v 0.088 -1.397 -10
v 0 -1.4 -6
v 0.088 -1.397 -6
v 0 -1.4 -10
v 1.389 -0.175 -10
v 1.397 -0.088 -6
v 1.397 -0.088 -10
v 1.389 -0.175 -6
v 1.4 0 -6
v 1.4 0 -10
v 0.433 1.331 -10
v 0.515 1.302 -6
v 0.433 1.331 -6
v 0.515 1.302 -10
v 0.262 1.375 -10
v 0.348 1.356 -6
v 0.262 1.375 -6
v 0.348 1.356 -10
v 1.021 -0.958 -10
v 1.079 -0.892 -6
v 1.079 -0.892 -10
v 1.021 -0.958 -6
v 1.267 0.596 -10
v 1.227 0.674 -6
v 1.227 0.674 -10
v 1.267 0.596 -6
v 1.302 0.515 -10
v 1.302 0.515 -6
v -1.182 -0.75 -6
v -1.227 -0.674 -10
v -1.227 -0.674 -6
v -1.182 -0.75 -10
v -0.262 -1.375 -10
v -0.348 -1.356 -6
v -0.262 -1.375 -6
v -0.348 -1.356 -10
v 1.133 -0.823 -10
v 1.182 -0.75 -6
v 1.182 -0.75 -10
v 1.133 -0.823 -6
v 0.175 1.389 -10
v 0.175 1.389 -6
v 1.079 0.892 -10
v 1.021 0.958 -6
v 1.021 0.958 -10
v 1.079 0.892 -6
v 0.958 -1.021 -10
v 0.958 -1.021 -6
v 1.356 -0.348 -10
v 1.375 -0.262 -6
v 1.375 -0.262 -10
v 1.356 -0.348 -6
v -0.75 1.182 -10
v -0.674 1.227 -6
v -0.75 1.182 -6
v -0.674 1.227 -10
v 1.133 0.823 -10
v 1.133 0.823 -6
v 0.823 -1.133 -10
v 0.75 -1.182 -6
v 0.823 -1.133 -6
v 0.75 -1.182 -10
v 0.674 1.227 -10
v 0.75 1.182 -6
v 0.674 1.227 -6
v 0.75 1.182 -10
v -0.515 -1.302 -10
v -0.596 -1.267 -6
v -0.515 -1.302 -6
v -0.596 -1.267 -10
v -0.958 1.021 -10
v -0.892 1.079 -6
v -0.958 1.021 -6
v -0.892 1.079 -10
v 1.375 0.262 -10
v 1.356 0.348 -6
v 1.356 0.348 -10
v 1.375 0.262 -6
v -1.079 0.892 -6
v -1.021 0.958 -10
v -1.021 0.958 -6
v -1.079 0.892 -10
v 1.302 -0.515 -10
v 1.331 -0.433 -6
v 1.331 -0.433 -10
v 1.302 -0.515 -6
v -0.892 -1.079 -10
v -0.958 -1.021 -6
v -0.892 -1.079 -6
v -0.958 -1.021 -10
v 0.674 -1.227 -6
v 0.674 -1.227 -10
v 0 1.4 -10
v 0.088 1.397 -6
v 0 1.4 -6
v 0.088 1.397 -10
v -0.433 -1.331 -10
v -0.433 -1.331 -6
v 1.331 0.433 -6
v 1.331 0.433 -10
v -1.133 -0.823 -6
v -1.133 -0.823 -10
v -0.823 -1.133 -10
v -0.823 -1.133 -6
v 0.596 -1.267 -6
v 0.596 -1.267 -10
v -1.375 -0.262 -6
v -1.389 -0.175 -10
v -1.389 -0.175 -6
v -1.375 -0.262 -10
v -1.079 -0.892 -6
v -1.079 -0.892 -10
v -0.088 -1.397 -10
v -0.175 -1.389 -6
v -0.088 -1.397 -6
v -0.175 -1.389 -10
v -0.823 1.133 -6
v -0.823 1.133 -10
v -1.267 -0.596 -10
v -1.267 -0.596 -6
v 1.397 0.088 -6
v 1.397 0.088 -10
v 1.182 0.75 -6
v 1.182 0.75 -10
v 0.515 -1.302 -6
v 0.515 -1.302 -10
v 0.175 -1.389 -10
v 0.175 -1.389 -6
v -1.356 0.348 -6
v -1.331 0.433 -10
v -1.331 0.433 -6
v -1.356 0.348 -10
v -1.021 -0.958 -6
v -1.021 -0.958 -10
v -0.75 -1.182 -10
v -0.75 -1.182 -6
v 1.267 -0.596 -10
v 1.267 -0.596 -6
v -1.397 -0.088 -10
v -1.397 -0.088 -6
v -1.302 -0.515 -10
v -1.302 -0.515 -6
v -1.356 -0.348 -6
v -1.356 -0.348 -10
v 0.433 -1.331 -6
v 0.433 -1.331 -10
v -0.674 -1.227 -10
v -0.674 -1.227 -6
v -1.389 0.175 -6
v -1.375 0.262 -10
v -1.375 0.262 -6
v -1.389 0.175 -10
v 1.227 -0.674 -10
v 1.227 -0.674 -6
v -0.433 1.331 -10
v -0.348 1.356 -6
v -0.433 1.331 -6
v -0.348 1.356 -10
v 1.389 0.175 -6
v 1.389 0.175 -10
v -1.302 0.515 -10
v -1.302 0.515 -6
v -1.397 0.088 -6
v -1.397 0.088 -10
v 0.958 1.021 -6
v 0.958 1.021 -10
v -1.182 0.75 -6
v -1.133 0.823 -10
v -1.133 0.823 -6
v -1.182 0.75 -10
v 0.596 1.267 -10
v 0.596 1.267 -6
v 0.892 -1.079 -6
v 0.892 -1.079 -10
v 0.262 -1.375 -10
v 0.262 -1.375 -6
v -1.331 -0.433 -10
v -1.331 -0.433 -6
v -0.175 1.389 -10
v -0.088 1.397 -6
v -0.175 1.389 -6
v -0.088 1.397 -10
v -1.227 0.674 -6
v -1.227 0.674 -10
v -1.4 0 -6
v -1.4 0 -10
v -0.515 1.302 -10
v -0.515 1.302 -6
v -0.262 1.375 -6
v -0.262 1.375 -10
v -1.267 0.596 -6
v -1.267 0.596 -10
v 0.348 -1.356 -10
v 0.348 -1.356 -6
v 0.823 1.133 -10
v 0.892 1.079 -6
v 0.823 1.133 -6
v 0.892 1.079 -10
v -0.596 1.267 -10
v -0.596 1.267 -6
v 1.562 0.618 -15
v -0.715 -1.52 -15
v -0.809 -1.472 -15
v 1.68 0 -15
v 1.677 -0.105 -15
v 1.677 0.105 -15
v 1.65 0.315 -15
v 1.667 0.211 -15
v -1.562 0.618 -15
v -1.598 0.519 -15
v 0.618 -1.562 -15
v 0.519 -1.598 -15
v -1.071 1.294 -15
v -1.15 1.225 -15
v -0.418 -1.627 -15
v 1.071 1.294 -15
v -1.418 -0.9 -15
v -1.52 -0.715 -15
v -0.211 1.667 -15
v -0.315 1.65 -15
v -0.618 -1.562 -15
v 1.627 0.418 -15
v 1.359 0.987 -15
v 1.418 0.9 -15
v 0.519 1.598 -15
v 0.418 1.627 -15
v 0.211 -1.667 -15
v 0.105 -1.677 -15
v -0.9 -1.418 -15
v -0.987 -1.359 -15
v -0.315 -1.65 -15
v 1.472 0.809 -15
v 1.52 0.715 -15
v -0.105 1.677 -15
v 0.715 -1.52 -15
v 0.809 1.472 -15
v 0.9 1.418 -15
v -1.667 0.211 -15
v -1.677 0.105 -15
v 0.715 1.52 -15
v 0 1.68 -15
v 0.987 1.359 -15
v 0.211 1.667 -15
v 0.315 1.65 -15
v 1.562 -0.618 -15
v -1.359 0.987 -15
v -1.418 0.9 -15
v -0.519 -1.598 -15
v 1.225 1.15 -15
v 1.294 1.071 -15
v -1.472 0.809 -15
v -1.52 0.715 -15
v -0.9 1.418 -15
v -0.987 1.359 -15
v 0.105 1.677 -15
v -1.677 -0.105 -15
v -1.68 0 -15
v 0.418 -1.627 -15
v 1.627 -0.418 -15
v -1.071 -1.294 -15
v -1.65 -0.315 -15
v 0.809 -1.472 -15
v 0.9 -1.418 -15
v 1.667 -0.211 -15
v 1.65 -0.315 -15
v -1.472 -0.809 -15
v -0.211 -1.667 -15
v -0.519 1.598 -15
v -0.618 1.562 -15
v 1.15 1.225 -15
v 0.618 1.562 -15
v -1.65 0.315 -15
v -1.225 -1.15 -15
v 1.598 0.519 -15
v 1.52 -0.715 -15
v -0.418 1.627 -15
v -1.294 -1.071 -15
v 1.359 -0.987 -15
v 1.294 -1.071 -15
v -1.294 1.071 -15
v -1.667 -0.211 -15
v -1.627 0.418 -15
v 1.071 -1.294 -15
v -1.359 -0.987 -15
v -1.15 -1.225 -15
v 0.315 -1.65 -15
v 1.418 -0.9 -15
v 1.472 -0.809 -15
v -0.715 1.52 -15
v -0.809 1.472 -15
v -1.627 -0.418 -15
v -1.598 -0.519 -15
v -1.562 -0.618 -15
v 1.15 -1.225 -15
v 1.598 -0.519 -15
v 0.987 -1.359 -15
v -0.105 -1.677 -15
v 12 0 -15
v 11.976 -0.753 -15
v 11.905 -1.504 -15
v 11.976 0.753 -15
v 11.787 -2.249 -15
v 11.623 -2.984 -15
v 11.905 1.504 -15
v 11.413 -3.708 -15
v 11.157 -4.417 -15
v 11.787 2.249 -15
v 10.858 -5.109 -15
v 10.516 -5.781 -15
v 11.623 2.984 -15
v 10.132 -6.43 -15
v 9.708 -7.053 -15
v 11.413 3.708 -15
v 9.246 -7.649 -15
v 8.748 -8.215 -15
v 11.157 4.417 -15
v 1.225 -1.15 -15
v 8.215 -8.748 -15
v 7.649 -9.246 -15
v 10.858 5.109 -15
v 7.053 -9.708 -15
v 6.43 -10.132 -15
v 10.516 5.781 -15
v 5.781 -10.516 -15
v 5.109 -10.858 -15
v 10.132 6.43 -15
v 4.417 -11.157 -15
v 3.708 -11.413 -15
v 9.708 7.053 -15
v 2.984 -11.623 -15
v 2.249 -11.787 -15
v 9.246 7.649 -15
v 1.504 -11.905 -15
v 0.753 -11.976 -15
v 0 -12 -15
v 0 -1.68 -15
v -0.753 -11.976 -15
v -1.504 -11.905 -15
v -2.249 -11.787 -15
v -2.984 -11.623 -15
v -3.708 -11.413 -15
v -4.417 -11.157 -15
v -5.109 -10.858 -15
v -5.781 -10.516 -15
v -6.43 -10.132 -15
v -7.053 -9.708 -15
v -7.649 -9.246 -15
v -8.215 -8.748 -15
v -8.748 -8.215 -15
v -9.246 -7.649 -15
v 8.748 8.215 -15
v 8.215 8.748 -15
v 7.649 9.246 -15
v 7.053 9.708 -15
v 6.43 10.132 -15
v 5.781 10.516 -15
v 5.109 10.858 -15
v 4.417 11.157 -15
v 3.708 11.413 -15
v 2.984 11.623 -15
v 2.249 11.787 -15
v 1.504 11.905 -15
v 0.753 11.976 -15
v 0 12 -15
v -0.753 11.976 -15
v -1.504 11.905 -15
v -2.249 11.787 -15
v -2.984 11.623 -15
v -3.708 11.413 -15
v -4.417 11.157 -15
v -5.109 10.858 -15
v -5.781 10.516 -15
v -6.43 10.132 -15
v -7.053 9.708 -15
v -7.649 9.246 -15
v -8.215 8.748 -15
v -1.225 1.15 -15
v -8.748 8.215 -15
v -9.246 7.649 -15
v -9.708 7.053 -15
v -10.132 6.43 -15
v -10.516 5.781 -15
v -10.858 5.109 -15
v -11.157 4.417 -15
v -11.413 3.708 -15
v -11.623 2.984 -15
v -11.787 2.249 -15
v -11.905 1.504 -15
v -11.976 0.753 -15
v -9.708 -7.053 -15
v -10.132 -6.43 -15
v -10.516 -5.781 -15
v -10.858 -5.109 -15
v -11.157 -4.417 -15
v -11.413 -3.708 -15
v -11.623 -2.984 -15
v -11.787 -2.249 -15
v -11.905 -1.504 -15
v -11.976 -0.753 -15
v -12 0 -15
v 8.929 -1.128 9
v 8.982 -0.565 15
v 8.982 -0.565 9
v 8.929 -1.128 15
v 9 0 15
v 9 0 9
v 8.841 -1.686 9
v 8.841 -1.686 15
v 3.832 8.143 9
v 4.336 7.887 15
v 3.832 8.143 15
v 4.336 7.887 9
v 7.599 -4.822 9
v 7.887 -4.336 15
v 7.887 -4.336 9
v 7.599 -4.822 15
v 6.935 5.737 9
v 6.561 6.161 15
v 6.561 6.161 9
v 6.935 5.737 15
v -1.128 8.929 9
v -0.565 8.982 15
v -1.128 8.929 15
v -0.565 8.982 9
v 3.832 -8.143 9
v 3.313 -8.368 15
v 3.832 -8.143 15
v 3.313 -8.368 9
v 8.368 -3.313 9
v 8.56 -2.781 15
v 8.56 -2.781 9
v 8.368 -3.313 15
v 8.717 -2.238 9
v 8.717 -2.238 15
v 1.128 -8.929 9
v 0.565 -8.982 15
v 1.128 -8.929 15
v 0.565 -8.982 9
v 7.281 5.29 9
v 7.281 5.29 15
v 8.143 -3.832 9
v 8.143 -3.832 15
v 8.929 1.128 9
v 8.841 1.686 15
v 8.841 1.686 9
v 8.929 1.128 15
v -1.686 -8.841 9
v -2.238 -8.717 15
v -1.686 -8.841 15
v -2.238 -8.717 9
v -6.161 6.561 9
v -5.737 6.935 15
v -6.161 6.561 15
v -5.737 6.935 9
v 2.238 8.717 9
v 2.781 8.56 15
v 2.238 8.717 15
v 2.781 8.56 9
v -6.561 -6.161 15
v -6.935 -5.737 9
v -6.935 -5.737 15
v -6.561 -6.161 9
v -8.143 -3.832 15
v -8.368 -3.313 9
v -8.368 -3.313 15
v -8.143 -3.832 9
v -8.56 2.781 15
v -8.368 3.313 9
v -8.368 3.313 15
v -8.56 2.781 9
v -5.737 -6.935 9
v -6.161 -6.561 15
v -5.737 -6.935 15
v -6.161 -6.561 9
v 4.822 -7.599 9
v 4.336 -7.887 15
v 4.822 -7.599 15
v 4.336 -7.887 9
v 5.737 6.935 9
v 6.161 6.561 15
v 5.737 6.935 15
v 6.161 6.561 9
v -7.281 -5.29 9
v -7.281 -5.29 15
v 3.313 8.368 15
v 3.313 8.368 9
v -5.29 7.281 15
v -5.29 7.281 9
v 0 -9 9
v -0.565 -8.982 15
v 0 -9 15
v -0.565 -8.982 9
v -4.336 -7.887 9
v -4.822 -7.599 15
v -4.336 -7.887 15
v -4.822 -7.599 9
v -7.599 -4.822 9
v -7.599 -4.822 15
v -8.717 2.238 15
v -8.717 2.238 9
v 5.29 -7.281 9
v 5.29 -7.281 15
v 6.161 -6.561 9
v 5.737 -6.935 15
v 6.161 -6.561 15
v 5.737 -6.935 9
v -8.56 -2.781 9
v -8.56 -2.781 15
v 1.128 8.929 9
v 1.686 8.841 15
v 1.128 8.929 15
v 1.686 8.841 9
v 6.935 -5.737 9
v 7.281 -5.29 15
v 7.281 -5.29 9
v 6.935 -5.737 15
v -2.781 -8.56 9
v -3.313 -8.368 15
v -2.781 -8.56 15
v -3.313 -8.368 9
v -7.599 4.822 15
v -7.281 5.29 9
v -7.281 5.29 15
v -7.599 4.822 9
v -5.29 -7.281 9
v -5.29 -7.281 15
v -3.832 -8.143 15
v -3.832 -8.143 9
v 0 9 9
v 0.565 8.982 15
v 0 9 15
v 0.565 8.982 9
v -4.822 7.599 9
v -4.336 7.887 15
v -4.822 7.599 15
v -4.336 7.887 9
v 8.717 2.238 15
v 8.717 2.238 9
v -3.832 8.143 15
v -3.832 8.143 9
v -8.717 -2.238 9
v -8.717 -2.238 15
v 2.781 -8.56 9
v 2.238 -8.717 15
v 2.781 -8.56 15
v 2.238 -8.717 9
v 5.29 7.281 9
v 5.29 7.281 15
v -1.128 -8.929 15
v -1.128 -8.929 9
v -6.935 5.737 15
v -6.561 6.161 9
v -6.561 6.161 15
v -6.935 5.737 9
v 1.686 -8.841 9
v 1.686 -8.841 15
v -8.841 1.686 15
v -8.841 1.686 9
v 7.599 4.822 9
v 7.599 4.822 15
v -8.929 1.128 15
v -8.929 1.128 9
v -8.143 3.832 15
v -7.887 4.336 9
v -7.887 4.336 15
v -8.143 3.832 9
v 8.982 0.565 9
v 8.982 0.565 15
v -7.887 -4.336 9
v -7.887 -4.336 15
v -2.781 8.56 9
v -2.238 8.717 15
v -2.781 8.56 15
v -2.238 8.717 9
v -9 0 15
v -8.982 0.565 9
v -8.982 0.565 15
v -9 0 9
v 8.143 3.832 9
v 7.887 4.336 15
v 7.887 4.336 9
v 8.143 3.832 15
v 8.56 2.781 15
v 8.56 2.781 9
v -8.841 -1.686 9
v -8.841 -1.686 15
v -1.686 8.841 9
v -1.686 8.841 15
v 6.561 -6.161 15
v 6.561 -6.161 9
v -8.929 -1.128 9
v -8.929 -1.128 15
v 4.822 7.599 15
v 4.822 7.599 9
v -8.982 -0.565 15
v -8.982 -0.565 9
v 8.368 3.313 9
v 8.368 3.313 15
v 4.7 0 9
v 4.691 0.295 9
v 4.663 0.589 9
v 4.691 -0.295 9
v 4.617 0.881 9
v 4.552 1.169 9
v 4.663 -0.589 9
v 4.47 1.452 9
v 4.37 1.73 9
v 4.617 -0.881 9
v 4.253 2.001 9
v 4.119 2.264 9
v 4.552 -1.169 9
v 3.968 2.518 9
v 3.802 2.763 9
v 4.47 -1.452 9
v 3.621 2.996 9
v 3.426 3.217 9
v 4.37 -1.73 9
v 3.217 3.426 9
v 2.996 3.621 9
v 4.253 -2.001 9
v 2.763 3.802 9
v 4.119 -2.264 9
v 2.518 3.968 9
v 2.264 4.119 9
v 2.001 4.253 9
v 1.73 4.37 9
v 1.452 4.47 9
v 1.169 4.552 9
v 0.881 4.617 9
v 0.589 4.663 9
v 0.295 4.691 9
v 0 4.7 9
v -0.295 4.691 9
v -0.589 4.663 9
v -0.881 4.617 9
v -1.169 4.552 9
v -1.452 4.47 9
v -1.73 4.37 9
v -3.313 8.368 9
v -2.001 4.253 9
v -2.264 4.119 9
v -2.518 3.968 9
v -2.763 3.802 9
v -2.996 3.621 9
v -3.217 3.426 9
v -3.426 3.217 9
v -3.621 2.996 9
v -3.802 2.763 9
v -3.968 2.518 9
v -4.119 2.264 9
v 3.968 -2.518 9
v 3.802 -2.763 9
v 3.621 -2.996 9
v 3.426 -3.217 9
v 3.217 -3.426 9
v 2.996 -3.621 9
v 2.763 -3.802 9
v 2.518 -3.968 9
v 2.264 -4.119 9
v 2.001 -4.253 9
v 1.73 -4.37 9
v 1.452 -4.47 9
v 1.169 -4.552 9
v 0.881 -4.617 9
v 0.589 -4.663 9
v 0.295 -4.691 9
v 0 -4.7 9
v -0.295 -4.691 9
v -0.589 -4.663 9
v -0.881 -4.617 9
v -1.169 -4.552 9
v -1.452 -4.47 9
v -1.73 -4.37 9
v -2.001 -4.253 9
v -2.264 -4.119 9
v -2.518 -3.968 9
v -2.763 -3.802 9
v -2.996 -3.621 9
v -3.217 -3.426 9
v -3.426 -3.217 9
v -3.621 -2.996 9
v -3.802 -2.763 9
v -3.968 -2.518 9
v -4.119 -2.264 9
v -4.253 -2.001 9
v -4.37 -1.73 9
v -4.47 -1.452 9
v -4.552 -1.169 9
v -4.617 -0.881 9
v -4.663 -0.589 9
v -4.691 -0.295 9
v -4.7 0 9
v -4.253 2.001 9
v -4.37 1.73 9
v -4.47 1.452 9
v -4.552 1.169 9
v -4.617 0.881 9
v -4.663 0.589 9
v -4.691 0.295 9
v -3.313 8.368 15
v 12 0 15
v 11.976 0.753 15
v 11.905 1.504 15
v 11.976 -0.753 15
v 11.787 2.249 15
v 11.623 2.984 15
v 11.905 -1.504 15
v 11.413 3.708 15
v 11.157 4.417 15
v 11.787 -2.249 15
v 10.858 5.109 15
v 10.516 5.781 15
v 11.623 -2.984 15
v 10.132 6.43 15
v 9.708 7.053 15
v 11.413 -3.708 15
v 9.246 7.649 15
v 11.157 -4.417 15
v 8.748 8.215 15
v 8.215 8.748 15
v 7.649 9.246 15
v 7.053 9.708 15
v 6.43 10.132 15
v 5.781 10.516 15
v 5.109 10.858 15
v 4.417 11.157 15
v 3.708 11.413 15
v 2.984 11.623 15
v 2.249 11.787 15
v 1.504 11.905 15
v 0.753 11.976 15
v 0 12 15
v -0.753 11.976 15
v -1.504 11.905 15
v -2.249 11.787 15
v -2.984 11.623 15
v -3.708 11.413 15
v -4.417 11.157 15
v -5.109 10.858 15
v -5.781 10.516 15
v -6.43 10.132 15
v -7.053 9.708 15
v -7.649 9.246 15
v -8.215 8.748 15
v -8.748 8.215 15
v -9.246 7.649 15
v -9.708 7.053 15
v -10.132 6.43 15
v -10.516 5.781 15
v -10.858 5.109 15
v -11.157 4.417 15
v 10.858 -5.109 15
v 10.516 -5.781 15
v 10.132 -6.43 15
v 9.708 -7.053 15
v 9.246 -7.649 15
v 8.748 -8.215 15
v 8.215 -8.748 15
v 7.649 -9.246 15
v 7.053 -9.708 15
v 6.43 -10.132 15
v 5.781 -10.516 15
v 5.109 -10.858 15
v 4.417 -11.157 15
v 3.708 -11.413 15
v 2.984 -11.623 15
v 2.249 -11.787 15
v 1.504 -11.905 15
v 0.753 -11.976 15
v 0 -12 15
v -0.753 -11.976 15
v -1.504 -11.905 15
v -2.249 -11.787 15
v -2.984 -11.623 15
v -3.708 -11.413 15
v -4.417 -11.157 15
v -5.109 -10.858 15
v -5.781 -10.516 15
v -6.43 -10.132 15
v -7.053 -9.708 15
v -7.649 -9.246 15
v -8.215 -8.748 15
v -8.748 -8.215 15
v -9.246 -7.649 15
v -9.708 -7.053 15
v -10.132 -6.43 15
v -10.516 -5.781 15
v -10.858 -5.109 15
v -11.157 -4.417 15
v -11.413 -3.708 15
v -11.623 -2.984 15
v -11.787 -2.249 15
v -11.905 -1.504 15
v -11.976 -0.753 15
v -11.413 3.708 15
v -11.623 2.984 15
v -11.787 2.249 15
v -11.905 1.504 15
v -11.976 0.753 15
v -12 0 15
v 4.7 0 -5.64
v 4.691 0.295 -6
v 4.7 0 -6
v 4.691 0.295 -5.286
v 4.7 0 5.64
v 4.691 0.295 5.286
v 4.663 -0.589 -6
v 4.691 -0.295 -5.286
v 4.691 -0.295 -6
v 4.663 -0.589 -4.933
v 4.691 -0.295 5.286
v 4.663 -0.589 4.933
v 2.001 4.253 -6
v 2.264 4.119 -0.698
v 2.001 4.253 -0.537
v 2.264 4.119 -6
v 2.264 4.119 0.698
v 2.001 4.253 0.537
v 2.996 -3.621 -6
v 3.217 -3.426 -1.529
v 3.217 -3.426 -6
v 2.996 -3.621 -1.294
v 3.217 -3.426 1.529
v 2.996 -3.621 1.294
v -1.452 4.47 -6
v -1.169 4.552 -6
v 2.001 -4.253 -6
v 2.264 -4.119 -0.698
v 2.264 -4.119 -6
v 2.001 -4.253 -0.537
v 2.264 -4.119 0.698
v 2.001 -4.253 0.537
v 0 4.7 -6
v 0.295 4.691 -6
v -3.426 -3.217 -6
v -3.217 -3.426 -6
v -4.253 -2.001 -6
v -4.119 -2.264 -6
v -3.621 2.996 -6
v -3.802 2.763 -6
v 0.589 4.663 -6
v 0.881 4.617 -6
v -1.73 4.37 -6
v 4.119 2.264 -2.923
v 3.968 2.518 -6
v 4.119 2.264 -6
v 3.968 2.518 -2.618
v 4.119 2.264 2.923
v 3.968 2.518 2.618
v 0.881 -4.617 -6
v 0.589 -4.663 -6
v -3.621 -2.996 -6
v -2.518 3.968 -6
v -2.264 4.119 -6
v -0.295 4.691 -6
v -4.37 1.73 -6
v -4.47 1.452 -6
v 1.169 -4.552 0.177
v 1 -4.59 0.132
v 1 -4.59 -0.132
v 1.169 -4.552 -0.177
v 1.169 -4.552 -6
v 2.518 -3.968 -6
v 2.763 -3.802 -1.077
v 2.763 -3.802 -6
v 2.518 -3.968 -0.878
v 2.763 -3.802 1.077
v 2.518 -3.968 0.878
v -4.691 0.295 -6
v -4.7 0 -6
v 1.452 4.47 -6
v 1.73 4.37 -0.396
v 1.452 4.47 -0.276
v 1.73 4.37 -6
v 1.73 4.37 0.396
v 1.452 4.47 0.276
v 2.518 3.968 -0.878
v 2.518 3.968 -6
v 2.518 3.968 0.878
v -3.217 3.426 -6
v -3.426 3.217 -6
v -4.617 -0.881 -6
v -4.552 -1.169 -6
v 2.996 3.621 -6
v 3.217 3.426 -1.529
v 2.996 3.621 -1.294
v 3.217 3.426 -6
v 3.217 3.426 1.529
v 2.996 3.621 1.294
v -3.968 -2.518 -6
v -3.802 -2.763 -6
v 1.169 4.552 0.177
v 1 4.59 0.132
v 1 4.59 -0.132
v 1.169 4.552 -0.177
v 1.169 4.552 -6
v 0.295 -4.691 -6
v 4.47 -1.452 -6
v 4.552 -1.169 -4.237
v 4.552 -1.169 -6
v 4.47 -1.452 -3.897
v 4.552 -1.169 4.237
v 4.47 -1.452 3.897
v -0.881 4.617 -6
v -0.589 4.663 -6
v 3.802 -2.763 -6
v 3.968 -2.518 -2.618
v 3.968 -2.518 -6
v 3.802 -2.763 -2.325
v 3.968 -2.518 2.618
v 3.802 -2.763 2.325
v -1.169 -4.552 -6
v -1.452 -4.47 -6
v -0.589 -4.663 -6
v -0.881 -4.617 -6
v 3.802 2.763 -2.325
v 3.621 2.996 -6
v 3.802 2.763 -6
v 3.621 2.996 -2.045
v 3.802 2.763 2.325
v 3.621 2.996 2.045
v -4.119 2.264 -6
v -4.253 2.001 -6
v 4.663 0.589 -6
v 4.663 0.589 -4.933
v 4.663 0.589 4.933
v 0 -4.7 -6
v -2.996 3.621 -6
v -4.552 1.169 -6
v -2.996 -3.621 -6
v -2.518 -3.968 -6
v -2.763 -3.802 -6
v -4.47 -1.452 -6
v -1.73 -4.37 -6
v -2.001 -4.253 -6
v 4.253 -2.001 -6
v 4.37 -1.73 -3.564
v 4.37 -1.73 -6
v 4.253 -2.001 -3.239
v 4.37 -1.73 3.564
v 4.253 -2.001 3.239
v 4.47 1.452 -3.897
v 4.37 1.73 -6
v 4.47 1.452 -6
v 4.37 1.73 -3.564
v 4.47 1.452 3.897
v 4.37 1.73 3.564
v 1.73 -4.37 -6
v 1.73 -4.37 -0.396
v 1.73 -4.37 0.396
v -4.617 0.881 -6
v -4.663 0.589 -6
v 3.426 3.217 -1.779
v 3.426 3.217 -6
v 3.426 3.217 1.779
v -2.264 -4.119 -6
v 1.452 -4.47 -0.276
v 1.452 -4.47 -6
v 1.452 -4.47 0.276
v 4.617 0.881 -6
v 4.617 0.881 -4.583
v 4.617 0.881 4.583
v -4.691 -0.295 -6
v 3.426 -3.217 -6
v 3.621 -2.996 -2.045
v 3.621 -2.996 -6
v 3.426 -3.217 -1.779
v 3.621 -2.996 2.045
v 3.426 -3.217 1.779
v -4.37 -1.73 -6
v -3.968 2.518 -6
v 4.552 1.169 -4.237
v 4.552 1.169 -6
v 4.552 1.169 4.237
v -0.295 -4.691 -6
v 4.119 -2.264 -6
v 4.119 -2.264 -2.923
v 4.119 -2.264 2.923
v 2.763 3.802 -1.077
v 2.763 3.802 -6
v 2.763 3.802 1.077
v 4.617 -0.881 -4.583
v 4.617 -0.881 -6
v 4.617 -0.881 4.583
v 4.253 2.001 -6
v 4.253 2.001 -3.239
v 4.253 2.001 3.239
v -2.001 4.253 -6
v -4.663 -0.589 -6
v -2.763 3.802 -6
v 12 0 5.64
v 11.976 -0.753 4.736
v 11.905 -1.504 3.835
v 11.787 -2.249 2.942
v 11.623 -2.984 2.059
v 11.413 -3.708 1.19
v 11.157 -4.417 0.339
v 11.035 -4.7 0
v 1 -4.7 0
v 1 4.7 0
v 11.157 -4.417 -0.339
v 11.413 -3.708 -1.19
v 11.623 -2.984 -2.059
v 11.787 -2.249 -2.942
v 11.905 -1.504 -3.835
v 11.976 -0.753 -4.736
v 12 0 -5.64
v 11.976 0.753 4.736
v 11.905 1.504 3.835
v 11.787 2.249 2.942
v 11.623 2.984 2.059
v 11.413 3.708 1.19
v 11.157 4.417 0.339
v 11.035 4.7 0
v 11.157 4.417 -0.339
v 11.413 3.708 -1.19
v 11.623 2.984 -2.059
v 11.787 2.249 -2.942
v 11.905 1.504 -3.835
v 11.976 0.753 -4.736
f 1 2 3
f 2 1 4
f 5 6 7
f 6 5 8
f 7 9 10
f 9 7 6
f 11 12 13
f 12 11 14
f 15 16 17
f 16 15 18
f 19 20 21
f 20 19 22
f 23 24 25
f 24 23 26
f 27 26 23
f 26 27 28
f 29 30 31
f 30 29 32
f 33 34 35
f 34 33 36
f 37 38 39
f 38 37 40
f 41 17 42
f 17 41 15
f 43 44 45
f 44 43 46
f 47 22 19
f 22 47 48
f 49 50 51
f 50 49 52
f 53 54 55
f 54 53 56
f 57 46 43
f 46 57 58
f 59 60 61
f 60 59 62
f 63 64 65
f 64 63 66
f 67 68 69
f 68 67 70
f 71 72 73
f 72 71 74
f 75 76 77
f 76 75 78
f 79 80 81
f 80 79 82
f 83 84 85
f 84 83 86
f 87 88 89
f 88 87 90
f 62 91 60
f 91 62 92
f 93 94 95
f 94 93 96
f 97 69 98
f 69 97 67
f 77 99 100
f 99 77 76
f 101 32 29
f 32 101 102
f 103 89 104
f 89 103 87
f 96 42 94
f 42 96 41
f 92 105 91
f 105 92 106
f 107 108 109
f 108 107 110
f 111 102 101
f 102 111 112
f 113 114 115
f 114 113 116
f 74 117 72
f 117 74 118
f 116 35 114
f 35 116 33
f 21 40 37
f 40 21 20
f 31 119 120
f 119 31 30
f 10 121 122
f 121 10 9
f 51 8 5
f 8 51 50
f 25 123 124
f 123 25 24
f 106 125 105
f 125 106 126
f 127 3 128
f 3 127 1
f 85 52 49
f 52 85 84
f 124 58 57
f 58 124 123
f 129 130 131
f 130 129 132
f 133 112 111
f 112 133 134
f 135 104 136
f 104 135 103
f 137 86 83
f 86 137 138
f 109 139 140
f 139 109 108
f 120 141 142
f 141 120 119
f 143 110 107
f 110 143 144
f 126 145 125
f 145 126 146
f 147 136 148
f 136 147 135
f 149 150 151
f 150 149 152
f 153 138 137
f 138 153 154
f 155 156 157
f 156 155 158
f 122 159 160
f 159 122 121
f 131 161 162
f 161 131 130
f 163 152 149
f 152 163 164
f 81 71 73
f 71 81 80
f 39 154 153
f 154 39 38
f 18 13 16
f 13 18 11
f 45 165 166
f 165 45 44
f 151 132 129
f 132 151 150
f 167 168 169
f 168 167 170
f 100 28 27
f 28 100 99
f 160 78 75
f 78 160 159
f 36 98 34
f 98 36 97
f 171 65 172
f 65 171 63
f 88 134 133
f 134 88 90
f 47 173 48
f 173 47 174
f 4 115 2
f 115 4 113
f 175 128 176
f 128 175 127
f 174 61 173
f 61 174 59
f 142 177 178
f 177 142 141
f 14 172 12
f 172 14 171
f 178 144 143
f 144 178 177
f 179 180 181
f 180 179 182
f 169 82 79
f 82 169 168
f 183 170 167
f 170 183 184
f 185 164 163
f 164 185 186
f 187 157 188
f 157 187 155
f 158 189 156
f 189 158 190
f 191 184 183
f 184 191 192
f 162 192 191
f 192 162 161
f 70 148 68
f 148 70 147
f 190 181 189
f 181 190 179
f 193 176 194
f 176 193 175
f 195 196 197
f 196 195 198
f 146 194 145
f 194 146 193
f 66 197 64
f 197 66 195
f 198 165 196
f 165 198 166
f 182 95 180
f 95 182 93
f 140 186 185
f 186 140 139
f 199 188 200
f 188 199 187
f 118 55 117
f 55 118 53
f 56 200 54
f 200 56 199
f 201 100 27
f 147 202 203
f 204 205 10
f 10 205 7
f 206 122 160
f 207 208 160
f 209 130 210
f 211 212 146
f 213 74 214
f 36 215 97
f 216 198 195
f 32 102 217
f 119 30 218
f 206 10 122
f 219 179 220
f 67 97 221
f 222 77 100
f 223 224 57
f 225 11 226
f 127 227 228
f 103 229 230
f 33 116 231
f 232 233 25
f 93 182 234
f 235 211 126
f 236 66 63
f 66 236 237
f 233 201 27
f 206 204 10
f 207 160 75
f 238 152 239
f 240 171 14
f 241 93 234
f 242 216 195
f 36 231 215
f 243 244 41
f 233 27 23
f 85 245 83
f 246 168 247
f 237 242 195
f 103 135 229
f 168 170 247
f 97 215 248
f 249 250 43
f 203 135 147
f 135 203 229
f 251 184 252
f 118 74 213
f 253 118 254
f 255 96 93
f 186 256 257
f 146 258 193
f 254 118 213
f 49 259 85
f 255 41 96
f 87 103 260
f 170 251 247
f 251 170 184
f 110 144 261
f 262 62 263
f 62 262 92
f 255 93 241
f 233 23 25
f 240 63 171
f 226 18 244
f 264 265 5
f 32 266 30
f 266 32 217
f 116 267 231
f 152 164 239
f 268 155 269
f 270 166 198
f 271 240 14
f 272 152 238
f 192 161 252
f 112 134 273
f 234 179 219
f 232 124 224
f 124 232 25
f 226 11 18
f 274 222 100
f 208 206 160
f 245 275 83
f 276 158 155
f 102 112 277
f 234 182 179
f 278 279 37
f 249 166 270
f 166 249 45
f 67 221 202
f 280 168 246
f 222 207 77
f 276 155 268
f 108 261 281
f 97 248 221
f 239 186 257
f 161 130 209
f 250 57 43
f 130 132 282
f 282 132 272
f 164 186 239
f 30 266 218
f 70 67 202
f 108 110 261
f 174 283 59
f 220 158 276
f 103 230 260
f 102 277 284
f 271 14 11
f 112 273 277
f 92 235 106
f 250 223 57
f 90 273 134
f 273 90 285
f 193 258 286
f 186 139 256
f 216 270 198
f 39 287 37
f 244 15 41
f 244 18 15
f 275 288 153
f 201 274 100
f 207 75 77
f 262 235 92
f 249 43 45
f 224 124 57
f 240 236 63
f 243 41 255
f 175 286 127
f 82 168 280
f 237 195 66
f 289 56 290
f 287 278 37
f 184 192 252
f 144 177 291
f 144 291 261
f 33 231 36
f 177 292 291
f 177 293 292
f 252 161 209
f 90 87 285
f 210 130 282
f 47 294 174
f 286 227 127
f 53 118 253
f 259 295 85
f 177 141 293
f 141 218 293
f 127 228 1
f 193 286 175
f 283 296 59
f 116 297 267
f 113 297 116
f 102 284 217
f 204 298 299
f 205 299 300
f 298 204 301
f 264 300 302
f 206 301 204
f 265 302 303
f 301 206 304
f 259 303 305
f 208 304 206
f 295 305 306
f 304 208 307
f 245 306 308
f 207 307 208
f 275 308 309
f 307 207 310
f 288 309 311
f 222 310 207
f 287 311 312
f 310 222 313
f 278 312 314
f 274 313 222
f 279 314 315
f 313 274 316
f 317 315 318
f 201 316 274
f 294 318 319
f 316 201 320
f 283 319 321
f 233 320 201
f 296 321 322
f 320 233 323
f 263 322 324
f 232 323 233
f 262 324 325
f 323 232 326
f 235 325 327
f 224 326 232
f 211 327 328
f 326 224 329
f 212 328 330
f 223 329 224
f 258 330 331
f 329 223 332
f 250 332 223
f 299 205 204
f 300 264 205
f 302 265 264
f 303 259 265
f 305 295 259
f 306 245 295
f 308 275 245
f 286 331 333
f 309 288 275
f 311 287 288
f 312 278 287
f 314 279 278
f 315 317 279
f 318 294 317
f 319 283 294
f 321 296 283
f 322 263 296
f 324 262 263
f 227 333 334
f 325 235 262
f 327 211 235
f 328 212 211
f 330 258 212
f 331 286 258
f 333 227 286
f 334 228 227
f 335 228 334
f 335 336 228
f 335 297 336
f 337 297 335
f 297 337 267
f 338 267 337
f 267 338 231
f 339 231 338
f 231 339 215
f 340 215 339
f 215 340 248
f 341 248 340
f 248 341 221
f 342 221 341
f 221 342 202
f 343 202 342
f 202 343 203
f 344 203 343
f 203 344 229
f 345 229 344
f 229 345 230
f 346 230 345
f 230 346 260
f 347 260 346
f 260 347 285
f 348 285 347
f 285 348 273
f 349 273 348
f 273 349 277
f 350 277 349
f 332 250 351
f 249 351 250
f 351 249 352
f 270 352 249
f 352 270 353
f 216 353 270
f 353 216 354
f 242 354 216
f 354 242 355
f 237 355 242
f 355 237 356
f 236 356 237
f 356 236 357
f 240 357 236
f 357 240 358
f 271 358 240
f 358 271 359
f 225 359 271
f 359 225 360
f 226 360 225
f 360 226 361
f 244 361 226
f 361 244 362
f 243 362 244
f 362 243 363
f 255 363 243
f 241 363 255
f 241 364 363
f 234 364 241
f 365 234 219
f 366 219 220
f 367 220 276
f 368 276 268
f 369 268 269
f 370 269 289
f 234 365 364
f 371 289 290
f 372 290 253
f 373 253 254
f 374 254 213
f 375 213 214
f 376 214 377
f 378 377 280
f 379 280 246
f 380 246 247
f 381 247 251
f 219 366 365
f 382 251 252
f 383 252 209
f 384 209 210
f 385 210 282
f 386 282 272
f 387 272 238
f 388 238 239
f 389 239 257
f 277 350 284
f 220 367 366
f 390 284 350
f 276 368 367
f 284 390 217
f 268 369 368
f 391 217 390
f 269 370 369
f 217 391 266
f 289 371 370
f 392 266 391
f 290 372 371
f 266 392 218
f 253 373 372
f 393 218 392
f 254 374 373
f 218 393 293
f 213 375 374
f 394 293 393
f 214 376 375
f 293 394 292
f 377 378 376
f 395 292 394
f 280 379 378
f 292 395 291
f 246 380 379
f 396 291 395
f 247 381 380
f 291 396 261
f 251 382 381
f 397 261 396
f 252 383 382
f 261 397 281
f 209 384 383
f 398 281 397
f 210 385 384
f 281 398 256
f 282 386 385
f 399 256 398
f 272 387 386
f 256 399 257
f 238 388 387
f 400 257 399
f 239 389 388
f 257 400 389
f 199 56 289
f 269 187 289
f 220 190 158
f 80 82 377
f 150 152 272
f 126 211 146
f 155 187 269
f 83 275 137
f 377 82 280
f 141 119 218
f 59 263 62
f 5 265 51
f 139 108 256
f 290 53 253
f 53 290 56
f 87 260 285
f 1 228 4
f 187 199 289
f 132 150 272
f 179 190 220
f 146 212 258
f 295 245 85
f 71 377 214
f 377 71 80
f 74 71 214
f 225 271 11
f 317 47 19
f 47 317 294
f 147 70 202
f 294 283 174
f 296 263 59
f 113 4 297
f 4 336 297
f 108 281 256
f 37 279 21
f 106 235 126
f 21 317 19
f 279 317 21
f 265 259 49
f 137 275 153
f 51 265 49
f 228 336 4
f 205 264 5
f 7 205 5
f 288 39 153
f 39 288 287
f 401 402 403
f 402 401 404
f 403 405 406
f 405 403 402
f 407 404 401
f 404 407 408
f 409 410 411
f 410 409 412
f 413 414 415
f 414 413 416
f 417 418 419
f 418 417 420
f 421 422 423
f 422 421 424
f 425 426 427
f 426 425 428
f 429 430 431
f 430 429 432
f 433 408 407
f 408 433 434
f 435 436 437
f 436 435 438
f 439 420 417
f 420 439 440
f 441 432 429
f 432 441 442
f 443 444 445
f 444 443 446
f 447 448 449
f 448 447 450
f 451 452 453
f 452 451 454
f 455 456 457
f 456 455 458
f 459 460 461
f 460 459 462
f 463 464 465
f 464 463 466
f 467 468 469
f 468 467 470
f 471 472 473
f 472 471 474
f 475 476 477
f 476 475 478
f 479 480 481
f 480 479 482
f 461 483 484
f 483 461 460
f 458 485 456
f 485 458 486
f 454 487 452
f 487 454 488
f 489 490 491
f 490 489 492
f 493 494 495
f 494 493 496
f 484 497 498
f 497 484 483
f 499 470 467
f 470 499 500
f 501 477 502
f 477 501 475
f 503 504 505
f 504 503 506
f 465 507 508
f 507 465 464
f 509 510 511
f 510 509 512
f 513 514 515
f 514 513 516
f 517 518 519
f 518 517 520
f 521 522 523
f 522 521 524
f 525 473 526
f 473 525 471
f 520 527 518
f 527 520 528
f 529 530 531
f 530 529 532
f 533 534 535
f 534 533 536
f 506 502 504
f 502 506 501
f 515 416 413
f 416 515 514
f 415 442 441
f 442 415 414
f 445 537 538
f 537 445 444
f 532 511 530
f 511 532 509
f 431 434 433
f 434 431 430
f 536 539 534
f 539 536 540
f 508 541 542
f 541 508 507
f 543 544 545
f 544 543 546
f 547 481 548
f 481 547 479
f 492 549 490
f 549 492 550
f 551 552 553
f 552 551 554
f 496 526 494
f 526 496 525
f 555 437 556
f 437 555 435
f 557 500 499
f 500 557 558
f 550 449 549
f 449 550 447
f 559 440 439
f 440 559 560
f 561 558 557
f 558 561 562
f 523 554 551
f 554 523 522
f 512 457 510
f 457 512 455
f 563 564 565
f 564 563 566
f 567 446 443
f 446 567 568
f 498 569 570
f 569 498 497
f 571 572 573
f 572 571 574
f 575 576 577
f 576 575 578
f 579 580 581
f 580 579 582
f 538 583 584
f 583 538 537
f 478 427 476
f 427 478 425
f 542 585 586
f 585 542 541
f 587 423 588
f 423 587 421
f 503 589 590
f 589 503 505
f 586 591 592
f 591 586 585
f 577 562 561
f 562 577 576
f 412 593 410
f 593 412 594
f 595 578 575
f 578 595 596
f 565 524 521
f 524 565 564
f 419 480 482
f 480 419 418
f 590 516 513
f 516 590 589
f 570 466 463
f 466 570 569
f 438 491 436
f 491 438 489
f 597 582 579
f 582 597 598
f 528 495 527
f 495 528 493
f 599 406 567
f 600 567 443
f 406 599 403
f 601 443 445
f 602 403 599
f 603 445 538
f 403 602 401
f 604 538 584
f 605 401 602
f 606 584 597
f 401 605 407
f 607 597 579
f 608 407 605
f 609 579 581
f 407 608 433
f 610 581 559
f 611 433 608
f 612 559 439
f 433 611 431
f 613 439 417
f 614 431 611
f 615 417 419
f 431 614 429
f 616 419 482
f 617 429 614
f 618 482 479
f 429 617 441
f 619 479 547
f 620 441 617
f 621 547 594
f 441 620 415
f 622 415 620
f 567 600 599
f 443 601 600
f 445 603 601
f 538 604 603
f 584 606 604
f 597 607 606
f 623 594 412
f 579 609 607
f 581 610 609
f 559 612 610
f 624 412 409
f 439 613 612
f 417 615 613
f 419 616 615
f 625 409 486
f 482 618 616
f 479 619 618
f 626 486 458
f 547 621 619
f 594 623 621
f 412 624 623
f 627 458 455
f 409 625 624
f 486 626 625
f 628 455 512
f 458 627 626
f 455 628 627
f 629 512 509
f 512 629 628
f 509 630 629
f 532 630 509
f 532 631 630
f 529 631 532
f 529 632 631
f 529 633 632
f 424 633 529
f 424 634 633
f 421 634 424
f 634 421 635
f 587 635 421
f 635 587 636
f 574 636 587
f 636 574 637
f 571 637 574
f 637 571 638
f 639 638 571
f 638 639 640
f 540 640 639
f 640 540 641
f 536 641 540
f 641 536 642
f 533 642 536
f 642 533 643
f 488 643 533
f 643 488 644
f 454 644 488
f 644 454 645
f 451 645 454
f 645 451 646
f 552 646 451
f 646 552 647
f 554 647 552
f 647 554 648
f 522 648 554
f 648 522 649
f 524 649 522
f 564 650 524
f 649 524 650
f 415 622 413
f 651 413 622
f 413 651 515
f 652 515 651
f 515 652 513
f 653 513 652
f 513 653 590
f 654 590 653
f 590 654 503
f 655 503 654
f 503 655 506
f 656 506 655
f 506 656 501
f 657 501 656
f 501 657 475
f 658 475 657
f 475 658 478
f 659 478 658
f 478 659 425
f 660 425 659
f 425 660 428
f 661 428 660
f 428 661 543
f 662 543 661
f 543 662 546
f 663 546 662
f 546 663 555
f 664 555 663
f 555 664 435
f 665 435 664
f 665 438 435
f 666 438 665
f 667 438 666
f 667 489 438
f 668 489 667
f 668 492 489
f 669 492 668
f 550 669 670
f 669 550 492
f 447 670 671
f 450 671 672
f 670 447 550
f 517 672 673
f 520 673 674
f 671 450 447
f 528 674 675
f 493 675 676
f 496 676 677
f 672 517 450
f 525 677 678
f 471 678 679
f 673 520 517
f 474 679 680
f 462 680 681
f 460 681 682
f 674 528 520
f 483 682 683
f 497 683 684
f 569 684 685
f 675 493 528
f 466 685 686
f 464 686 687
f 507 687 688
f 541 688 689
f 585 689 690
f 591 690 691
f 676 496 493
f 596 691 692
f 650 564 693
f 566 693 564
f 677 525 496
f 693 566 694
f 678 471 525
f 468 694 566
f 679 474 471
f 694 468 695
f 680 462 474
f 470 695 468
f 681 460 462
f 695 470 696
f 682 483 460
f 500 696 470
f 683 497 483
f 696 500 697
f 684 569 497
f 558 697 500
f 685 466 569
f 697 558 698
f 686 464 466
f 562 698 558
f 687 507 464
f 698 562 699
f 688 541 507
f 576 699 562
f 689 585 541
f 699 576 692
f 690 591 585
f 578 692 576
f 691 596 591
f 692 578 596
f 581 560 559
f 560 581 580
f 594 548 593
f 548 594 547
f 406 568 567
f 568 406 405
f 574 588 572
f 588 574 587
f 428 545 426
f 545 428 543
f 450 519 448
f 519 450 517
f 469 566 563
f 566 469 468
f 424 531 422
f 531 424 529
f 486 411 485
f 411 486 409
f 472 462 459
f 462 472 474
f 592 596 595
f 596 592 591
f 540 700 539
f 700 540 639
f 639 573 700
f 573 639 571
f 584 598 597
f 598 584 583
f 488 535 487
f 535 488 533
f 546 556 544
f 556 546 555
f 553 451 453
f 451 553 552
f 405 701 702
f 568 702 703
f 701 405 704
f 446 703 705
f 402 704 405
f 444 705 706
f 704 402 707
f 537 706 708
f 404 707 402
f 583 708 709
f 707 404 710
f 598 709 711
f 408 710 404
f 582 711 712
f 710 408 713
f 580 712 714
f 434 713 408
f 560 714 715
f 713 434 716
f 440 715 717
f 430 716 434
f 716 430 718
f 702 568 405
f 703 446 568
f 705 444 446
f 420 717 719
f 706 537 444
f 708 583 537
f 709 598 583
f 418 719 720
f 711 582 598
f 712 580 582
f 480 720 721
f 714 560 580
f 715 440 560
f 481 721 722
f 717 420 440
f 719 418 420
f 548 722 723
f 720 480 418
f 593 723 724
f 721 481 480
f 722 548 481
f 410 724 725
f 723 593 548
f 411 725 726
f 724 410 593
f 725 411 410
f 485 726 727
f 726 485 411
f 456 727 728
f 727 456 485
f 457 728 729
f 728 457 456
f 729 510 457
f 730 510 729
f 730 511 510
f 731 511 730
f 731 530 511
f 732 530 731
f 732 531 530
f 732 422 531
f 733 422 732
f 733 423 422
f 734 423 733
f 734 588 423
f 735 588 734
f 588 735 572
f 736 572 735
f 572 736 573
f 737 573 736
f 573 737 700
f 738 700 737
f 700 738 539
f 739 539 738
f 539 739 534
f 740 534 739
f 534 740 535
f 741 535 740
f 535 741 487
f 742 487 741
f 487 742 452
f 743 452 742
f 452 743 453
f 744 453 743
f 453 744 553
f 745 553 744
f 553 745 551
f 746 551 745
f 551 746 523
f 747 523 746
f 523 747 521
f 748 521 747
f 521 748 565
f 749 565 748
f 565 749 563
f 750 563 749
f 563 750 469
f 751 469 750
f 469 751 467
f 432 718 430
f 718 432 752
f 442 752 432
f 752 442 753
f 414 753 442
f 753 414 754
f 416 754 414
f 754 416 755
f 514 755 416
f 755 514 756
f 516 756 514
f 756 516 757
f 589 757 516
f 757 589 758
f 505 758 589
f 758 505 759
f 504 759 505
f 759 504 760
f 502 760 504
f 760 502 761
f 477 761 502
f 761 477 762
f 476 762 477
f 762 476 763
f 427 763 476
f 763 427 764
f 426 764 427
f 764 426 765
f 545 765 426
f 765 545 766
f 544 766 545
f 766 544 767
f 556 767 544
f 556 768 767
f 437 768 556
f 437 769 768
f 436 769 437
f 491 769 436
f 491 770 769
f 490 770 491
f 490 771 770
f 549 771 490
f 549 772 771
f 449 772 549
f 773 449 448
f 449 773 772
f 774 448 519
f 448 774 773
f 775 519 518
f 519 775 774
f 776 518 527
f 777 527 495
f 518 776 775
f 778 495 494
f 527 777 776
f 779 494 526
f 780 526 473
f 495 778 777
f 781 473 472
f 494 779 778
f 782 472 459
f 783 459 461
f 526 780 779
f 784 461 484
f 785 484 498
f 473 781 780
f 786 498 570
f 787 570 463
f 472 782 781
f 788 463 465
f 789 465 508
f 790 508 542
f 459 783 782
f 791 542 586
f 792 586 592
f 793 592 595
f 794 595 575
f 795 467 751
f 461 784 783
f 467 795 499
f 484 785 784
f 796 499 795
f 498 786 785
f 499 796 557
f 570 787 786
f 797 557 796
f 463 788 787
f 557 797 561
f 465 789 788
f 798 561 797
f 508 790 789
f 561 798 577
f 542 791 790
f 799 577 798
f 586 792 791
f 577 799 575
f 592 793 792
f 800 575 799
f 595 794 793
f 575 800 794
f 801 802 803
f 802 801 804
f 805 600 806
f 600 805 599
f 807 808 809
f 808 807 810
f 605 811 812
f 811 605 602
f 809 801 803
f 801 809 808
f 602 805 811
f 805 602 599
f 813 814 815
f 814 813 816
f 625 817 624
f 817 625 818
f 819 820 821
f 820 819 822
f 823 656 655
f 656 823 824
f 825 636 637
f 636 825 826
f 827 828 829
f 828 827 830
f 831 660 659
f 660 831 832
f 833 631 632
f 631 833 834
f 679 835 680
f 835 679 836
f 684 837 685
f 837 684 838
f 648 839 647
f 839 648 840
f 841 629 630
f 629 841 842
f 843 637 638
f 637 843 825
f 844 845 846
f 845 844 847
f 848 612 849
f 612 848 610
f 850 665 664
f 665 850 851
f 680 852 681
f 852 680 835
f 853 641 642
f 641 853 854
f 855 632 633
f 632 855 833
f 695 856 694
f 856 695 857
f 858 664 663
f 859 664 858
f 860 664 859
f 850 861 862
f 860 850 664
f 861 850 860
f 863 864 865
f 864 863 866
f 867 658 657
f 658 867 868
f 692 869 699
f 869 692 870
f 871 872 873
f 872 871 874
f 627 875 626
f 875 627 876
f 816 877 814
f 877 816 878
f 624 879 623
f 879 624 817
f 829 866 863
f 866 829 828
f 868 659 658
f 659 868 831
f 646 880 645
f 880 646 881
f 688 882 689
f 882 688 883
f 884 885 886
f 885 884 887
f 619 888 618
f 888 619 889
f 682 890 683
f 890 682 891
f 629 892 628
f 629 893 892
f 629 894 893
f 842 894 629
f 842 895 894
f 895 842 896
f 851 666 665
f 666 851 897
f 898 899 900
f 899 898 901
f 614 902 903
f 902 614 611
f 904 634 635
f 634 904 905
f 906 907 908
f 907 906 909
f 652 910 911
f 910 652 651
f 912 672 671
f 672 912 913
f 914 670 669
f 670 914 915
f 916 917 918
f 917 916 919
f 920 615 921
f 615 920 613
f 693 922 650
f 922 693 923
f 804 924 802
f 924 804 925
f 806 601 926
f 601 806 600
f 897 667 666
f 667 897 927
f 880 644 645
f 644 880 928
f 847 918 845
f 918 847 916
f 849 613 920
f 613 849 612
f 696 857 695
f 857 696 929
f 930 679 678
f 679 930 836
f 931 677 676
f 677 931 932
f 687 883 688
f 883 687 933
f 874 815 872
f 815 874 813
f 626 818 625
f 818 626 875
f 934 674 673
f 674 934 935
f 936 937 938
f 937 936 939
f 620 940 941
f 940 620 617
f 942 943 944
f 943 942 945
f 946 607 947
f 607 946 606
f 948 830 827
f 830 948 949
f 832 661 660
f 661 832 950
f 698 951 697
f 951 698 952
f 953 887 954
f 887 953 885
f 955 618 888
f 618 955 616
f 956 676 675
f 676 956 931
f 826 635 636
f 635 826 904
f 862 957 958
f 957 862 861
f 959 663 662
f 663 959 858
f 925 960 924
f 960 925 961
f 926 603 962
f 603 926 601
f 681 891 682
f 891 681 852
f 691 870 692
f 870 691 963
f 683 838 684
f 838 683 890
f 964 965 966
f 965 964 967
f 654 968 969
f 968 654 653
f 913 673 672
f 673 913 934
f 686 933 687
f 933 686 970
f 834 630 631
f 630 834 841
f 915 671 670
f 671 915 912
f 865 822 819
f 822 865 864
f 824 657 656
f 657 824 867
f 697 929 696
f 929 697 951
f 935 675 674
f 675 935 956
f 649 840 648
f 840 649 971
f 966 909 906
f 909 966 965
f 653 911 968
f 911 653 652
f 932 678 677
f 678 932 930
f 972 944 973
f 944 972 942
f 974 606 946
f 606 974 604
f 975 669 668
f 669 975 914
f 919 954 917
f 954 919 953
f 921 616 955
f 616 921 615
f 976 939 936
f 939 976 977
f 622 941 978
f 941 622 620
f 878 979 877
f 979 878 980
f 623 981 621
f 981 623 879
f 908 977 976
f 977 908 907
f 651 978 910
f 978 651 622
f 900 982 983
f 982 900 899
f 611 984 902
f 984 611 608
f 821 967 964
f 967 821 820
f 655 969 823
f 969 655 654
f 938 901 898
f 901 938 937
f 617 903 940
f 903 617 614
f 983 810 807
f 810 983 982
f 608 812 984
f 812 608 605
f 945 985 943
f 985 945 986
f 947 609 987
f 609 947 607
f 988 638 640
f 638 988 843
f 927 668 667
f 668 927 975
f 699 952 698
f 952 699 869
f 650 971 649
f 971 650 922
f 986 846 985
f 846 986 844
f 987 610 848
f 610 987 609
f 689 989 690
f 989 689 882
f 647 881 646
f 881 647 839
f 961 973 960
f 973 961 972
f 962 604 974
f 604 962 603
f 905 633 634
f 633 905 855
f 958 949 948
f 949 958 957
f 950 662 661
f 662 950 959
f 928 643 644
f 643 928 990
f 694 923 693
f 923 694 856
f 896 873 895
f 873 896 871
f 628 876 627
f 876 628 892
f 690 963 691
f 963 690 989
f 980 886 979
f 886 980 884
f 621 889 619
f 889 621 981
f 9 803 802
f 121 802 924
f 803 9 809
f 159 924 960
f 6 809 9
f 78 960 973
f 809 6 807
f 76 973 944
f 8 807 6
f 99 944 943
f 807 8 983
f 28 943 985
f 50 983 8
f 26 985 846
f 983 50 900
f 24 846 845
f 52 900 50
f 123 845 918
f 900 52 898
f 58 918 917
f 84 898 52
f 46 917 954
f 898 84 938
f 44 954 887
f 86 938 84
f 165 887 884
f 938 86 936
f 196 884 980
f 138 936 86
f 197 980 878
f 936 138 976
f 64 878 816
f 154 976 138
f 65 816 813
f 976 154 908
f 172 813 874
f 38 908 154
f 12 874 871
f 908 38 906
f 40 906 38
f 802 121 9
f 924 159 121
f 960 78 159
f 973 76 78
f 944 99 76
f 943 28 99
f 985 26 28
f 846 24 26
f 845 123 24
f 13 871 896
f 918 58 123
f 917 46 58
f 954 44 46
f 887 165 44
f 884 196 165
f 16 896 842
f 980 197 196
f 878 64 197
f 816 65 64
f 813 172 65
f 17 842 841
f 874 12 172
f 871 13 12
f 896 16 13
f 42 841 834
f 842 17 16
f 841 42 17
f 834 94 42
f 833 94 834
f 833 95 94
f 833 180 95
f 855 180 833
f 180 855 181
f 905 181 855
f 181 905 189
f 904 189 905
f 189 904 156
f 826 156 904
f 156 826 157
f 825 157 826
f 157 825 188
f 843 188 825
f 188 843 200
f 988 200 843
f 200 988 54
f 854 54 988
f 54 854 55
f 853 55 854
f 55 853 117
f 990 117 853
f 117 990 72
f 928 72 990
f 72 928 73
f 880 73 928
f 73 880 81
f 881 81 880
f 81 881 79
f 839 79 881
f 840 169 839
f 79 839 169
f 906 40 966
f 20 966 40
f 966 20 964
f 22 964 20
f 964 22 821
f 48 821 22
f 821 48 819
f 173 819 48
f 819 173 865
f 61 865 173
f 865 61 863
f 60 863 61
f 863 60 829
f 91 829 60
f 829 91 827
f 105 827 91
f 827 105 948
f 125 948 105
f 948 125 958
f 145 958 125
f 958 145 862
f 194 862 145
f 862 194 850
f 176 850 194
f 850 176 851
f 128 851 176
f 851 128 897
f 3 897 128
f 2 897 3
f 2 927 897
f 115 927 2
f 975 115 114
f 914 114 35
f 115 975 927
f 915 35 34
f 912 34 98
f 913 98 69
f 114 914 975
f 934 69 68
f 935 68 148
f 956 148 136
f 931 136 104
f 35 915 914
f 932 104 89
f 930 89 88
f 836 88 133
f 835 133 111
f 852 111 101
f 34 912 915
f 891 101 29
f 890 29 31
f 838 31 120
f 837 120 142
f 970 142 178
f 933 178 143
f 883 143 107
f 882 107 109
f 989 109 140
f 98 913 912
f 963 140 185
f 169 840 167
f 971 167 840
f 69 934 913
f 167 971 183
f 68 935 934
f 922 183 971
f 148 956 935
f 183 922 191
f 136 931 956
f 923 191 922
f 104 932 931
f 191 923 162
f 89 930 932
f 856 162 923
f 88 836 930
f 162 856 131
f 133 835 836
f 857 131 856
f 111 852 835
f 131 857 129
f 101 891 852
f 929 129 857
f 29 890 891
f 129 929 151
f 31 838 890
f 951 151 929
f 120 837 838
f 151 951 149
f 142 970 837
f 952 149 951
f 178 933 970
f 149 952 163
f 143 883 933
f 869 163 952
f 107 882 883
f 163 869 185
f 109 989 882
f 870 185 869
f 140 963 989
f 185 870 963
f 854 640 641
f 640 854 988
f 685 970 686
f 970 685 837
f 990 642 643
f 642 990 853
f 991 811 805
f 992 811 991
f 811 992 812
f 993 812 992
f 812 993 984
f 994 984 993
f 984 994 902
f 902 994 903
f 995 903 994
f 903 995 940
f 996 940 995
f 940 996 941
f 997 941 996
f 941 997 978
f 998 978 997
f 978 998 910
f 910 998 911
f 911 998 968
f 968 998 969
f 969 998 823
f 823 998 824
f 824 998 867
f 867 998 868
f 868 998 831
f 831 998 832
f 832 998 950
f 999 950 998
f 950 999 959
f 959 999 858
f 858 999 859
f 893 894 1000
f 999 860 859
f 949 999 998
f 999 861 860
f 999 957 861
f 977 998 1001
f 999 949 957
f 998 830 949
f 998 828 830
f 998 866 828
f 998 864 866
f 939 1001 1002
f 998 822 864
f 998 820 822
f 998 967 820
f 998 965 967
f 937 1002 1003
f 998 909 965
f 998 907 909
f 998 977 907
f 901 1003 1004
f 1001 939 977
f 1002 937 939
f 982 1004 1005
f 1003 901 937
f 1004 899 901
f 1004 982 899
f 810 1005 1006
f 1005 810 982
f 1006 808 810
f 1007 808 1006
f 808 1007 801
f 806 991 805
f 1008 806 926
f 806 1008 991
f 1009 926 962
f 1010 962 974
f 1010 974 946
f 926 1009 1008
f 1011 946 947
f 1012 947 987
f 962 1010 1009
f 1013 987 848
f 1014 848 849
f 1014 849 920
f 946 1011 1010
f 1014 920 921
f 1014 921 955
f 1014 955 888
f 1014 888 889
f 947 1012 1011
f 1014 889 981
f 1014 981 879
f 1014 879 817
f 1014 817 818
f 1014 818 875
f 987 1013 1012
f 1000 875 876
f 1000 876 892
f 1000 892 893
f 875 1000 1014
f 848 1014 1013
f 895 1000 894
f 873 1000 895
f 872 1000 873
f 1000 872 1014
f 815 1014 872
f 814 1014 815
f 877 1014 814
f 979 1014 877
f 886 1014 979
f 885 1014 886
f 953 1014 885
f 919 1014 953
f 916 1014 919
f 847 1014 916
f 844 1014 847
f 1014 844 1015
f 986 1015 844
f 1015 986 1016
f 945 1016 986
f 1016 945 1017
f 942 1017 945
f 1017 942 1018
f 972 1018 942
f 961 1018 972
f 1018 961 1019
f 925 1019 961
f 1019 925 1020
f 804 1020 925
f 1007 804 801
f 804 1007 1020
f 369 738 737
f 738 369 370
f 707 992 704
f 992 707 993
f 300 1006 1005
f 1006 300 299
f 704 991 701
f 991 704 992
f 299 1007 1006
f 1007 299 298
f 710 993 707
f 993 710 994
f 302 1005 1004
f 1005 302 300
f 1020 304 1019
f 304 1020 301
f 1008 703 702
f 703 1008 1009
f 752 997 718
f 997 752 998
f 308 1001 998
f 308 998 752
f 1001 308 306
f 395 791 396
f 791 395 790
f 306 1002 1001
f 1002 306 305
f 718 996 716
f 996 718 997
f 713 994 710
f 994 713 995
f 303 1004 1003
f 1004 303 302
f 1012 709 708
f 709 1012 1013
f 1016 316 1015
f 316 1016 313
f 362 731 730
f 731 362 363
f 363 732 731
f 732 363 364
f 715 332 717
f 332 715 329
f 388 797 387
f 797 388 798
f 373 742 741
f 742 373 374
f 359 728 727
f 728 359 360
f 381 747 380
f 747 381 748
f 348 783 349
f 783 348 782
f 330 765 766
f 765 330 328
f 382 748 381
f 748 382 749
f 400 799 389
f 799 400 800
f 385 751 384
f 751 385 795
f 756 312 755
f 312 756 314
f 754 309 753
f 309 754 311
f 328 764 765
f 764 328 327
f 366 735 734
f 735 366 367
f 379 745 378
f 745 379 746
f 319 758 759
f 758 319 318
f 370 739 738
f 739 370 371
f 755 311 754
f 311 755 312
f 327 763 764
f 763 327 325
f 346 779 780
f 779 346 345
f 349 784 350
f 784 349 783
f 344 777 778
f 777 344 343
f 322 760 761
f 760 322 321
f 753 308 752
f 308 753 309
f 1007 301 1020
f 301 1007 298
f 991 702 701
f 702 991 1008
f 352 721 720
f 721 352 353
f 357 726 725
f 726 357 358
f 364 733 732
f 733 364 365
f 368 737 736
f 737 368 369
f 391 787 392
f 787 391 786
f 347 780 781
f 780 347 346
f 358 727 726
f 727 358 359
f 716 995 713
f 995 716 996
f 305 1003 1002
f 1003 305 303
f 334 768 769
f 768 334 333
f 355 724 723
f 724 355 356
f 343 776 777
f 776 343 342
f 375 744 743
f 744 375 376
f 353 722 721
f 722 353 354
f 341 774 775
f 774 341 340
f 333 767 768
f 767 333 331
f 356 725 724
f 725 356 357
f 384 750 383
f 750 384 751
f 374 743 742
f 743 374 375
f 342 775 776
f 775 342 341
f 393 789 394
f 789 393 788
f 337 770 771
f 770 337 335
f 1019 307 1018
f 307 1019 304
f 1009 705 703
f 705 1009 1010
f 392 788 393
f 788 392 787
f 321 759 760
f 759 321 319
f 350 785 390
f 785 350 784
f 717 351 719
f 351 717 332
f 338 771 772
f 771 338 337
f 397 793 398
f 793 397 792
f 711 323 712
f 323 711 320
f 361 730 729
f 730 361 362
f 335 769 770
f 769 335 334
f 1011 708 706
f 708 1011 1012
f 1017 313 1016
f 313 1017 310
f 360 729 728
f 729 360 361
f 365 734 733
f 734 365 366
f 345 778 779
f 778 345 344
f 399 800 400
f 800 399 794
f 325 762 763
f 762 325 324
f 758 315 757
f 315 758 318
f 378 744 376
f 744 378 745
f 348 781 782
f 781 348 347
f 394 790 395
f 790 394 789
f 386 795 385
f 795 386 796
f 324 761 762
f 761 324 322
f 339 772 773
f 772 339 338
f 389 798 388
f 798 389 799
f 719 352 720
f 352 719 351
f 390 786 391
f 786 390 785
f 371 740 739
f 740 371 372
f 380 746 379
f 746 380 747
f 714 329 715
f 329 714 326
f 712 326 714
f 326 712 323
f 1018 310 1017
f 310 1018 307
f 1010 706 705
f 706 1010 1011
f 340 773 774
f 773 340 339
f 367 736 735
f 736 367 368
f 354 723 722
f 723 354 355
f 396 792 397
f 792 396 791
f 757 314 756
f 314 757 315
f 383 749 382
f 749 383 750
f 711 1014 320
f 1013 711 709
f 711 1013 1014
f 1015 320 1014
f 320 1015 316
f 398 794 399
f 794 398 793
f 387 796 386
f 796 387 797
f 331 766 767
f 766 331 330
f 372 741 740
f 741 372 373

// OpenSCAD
//Variabels
res=100;

gum_h=6;
gum_r=18/2;

output_r=7;

cube_l=30;

capsule_top=9/2+0.2;
capsule_bottom=18;
capsule_rest=16;

screw_r=1.4;

margin=3;

h1=cube_l/2+5;
d1=sqrt(capsule_top*capsule_top*2);

//Modules
module screw_hole() {
	cylinder(r=screw_r,h=10,center=true,$fn=res);
	translate([0,0,7.5])cylinder(r1=screw_r,r2=screw_r*1.2,h=5,center=true,$fn=res);
}
module gum() {
	cylinder(r=gum_r,h=gum_h,center=true,$fn=res);
}
module cut() {
	translate([0,0,-cube_l/2+gum_h/2])gum();
	translate([0,0,-cube_l/2+(capsule_rest-4)])cylinder(r=capsule_top,h=capsule_rest+2,center=true,$fn=res);
	translate([0,0,5])screw_hole();
	scale(v=[1,1,1.2])rotate(a=[180,0,0]){rotate(a=[0,90,0])rotate(a=[0,0,45])translate([0,0,h1/2+1])cube([d1,d1,h1],center=true);
}

}
module body() {
	cylinder(r=capsule_bottom/2+margin,h=30,center=true,$fn=res);
}
	//Render
rotate(a=[180,0,0])difference() {
	body();
	cut();
}
